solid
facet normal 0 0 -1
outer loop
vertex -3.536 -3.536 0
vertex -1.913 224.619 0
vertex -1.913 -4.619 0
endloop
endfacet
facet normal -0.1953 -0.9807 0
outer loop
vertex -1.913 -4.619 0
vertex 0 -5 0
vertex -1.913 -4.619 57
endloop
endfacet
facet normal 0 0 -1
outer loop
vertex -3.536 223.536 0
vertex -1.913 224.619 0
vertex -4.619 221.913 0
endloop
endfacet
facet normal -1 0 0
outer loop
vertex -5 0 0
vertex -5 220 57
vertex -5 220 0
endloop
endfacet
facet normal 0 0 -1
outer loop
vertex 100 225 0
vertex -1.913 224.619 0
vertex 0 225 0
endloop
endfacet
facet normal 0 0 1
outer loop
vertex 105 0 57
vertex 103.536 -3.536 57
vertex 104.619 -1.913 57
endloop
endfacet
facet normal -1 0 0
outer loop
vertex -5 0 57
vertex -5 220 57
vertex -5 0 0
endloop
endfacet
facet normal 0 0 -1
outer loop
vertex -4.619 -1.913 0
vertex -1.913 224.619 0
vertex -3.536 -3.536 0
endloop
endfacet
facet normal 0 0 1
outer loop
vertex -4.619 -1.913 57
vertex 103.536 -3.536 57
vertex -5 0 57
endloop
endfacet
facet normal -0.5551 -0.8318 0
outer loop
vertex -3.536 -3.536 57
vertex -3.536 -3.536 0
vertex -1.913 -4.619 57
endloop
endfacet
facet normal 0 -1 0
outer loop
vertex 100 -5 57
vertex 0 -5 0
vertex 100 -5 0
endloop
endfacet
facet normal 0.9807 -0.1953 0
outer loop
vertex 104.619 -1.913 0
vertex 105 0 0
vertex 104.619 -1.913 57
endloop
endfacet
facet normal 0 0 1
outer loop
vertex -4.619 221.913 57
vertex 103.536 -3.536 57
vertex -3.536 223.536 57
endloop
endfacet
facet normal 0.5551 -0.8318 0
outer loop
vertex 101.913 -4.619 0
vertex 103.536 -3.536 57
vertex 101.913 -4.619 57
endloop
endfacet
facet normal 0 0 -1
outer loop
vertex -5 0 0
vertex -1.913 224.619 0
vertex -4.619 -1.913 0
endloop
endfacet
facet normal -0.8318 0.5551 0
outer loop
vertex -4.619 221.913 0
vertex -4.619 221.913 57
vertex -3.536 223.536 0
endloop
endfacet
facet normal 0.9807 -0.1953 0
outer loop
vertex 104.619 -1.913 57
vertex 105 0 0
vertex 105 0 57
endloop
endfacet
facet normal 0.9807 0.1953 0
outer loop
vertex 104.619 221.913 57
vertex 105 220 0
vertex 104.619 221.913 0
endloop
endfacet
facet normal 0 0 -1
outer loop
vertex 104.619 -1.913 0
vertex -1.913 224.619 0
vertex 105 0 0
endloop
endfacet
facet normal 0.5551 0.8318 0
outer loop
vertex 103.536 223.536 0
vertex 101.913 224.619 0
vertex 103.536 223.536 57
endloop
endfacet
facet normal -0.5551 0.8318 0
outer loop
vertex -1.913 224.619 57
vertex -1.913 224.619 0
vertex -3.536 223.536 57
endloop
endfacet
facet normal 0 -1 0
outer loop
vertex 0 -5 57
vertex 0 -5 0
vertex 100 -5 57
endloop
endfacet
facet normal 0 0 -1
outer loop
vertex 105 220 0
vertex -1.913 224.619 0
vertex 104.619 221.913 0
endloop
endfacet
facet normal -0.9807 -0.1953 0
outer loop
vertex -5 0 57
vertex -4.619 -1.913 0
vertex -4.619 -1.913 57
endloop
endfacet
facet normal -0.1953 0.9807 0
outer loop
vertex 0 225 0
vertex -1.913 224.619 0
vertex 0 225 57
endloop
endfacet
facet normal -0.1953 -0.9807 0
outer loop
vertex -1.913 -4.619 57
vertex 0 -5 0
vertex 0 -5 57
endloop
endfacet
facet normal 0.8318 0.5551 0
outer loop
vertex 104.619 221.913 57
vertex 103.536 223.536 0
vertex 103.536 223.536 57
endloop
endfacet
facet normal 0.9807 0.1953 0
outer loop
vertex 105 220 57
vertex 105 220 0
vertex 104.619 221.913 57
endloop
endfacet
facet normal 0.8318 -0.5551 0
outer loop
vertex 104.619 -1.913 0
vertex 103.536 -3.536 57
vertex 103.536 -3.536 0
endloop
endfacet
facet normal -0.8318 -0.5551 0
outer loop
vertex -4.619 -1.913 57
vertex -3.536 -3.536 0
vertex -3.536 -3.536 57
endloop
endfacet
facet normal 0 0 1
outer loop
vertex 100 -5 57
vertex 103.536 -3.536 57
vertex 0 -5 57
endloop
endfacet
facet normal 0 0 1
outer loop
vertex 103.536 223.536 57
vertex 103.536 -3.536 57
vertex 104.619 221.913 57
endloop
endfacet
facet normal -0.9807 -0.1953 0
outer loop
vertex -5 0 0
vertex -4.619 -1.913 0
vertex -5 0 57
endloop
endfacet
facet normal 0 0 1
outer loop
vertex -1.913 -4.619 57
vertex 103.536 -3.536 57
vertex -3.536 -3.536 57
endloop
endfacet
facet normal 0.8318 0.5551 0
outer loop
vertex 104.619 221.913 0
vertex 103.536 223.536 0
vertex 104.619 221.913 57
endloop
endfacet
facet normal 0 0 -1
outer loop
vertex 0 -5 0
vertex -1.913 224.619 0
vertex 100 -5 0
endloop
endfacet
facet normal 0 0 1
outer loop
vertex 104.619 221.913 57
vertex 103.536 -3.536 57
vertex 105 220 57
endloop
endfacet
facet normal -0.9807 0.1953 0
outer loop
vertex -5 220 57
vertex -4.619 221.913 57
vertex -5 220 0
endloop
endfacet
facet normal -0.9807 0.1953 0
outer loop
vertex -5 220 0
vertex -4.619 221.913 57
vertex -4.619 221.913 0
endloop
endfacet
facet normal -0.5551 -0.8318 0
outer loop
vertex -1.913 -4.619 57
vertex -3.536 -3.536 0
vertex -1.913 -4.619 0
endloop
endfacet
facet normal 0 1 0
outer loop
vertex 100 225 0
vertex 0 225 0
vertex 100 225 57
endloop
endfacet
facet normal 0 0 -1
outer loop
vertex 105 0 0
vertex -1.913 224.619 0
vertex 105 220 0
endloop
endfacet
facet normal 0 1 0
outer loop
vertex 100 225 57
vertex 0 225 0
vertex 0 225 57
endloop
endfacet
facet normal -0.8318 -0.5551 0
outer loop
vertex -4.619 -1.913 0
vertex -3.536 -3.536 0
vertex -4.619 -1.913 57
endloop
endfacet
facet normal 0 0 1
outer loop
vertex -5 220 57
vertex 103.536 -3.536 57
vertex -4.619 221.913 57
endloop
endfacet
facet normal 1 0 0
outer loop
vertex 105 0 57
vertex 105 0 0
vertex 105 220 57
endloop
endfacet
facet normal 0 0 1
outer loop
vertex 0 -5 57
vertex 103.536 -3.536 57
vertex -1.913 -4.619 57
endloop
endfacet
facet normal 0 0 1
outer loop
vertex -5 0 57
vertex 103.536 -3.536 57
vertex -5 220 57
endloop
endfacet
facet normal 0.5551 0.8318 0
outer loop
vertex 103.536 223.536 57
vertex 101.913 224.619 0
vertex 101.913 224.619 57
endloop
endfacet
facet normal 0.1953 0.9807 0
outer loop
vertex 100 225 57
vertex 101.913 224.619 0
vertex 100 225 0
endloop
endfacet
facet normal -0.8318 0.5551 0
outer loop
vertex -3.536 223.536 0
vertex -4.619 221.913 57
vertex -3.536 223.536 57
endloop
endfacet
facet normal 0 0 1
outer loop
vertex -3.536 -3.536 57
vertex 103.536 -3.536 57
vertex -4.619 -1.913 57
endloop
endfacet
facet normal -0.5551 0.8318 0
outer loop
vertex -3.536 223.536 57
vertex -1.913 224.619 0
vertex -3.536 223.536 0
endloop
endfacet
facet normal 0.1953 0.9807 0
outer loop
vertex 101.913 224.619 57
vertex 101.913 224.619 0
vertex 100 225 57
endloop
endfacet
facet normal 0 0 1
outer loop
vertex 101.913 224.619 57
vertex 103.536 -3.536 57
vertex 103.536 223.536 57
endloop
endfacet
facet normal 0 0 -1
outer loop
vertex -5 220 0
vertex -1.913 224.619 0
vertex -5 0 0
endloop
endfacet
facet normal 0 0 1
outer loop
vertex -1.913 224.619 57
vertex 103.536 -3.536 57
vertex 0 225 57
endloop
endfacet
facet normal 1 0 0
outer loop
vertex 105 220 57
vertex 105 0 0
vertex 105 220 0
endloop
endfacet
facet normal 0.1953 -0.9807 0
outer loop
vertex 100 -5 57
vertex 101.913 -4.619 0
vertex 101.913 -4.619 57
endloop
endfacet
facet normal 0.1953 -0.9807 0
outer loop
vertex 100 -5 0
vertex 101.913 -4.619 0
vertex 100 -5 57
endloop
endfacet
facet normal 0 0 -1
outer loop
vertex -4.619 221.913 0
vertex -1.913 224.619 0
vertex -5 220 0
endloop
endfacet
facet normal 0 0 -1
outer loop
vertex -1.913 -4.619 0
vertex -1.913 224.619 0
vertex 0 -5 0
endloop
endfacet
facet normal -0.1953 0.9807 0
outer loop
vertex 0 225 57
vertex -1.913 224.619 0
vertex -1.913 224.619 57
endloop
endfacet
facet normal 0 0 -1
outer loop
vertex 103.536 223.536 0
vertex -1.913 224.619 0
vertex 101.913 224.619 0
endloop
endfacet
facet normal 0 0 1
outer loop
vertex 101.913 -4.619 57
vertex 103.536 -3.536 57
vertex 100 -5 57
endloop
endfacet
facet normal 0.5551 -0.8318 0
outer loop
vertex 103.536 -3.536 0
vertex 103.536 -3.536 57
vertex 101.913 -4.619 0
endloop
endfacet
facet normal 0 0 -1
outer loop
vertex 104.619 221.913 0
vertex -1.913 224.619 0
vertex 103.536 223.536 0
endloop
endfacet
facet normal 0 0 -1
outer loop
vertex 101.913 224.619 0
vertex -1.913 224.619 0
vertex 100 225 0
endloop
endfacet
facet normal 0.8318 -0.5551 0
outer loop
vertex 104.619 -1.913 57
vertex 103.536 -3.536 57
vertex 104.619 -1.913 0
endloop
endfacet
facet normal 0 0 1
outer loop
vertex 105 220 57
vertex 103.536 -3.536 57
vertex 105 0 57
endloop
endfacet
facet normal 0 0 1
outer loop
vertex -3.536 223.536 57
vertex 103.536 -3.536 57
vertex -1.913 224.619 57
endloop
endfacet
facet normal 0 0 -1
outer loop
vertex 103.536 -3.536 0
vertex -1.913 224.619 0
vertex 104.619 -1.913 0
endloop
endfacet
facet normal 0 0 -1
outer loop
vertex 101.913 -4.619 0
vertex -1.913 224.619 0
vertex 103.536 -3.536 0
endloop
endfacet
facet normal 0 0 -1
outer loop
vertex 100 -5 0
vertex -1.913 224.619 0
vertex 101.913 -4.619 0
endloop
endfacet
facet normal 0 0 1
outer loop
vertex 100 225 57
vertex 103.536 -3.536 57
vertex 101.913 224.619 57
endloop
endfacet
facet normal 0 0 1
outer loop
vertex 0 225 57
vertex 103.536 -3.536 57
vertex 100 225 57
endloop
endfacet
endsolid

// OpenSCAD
hull(){
cylinder(d=10,h=57);
translate([100,0,0])cylinder(d=10,h=57);
translate([100,220,0])cylinder(d=10,h=57);
translate([0,220,0])cylinder(d=10,h=57);
}
